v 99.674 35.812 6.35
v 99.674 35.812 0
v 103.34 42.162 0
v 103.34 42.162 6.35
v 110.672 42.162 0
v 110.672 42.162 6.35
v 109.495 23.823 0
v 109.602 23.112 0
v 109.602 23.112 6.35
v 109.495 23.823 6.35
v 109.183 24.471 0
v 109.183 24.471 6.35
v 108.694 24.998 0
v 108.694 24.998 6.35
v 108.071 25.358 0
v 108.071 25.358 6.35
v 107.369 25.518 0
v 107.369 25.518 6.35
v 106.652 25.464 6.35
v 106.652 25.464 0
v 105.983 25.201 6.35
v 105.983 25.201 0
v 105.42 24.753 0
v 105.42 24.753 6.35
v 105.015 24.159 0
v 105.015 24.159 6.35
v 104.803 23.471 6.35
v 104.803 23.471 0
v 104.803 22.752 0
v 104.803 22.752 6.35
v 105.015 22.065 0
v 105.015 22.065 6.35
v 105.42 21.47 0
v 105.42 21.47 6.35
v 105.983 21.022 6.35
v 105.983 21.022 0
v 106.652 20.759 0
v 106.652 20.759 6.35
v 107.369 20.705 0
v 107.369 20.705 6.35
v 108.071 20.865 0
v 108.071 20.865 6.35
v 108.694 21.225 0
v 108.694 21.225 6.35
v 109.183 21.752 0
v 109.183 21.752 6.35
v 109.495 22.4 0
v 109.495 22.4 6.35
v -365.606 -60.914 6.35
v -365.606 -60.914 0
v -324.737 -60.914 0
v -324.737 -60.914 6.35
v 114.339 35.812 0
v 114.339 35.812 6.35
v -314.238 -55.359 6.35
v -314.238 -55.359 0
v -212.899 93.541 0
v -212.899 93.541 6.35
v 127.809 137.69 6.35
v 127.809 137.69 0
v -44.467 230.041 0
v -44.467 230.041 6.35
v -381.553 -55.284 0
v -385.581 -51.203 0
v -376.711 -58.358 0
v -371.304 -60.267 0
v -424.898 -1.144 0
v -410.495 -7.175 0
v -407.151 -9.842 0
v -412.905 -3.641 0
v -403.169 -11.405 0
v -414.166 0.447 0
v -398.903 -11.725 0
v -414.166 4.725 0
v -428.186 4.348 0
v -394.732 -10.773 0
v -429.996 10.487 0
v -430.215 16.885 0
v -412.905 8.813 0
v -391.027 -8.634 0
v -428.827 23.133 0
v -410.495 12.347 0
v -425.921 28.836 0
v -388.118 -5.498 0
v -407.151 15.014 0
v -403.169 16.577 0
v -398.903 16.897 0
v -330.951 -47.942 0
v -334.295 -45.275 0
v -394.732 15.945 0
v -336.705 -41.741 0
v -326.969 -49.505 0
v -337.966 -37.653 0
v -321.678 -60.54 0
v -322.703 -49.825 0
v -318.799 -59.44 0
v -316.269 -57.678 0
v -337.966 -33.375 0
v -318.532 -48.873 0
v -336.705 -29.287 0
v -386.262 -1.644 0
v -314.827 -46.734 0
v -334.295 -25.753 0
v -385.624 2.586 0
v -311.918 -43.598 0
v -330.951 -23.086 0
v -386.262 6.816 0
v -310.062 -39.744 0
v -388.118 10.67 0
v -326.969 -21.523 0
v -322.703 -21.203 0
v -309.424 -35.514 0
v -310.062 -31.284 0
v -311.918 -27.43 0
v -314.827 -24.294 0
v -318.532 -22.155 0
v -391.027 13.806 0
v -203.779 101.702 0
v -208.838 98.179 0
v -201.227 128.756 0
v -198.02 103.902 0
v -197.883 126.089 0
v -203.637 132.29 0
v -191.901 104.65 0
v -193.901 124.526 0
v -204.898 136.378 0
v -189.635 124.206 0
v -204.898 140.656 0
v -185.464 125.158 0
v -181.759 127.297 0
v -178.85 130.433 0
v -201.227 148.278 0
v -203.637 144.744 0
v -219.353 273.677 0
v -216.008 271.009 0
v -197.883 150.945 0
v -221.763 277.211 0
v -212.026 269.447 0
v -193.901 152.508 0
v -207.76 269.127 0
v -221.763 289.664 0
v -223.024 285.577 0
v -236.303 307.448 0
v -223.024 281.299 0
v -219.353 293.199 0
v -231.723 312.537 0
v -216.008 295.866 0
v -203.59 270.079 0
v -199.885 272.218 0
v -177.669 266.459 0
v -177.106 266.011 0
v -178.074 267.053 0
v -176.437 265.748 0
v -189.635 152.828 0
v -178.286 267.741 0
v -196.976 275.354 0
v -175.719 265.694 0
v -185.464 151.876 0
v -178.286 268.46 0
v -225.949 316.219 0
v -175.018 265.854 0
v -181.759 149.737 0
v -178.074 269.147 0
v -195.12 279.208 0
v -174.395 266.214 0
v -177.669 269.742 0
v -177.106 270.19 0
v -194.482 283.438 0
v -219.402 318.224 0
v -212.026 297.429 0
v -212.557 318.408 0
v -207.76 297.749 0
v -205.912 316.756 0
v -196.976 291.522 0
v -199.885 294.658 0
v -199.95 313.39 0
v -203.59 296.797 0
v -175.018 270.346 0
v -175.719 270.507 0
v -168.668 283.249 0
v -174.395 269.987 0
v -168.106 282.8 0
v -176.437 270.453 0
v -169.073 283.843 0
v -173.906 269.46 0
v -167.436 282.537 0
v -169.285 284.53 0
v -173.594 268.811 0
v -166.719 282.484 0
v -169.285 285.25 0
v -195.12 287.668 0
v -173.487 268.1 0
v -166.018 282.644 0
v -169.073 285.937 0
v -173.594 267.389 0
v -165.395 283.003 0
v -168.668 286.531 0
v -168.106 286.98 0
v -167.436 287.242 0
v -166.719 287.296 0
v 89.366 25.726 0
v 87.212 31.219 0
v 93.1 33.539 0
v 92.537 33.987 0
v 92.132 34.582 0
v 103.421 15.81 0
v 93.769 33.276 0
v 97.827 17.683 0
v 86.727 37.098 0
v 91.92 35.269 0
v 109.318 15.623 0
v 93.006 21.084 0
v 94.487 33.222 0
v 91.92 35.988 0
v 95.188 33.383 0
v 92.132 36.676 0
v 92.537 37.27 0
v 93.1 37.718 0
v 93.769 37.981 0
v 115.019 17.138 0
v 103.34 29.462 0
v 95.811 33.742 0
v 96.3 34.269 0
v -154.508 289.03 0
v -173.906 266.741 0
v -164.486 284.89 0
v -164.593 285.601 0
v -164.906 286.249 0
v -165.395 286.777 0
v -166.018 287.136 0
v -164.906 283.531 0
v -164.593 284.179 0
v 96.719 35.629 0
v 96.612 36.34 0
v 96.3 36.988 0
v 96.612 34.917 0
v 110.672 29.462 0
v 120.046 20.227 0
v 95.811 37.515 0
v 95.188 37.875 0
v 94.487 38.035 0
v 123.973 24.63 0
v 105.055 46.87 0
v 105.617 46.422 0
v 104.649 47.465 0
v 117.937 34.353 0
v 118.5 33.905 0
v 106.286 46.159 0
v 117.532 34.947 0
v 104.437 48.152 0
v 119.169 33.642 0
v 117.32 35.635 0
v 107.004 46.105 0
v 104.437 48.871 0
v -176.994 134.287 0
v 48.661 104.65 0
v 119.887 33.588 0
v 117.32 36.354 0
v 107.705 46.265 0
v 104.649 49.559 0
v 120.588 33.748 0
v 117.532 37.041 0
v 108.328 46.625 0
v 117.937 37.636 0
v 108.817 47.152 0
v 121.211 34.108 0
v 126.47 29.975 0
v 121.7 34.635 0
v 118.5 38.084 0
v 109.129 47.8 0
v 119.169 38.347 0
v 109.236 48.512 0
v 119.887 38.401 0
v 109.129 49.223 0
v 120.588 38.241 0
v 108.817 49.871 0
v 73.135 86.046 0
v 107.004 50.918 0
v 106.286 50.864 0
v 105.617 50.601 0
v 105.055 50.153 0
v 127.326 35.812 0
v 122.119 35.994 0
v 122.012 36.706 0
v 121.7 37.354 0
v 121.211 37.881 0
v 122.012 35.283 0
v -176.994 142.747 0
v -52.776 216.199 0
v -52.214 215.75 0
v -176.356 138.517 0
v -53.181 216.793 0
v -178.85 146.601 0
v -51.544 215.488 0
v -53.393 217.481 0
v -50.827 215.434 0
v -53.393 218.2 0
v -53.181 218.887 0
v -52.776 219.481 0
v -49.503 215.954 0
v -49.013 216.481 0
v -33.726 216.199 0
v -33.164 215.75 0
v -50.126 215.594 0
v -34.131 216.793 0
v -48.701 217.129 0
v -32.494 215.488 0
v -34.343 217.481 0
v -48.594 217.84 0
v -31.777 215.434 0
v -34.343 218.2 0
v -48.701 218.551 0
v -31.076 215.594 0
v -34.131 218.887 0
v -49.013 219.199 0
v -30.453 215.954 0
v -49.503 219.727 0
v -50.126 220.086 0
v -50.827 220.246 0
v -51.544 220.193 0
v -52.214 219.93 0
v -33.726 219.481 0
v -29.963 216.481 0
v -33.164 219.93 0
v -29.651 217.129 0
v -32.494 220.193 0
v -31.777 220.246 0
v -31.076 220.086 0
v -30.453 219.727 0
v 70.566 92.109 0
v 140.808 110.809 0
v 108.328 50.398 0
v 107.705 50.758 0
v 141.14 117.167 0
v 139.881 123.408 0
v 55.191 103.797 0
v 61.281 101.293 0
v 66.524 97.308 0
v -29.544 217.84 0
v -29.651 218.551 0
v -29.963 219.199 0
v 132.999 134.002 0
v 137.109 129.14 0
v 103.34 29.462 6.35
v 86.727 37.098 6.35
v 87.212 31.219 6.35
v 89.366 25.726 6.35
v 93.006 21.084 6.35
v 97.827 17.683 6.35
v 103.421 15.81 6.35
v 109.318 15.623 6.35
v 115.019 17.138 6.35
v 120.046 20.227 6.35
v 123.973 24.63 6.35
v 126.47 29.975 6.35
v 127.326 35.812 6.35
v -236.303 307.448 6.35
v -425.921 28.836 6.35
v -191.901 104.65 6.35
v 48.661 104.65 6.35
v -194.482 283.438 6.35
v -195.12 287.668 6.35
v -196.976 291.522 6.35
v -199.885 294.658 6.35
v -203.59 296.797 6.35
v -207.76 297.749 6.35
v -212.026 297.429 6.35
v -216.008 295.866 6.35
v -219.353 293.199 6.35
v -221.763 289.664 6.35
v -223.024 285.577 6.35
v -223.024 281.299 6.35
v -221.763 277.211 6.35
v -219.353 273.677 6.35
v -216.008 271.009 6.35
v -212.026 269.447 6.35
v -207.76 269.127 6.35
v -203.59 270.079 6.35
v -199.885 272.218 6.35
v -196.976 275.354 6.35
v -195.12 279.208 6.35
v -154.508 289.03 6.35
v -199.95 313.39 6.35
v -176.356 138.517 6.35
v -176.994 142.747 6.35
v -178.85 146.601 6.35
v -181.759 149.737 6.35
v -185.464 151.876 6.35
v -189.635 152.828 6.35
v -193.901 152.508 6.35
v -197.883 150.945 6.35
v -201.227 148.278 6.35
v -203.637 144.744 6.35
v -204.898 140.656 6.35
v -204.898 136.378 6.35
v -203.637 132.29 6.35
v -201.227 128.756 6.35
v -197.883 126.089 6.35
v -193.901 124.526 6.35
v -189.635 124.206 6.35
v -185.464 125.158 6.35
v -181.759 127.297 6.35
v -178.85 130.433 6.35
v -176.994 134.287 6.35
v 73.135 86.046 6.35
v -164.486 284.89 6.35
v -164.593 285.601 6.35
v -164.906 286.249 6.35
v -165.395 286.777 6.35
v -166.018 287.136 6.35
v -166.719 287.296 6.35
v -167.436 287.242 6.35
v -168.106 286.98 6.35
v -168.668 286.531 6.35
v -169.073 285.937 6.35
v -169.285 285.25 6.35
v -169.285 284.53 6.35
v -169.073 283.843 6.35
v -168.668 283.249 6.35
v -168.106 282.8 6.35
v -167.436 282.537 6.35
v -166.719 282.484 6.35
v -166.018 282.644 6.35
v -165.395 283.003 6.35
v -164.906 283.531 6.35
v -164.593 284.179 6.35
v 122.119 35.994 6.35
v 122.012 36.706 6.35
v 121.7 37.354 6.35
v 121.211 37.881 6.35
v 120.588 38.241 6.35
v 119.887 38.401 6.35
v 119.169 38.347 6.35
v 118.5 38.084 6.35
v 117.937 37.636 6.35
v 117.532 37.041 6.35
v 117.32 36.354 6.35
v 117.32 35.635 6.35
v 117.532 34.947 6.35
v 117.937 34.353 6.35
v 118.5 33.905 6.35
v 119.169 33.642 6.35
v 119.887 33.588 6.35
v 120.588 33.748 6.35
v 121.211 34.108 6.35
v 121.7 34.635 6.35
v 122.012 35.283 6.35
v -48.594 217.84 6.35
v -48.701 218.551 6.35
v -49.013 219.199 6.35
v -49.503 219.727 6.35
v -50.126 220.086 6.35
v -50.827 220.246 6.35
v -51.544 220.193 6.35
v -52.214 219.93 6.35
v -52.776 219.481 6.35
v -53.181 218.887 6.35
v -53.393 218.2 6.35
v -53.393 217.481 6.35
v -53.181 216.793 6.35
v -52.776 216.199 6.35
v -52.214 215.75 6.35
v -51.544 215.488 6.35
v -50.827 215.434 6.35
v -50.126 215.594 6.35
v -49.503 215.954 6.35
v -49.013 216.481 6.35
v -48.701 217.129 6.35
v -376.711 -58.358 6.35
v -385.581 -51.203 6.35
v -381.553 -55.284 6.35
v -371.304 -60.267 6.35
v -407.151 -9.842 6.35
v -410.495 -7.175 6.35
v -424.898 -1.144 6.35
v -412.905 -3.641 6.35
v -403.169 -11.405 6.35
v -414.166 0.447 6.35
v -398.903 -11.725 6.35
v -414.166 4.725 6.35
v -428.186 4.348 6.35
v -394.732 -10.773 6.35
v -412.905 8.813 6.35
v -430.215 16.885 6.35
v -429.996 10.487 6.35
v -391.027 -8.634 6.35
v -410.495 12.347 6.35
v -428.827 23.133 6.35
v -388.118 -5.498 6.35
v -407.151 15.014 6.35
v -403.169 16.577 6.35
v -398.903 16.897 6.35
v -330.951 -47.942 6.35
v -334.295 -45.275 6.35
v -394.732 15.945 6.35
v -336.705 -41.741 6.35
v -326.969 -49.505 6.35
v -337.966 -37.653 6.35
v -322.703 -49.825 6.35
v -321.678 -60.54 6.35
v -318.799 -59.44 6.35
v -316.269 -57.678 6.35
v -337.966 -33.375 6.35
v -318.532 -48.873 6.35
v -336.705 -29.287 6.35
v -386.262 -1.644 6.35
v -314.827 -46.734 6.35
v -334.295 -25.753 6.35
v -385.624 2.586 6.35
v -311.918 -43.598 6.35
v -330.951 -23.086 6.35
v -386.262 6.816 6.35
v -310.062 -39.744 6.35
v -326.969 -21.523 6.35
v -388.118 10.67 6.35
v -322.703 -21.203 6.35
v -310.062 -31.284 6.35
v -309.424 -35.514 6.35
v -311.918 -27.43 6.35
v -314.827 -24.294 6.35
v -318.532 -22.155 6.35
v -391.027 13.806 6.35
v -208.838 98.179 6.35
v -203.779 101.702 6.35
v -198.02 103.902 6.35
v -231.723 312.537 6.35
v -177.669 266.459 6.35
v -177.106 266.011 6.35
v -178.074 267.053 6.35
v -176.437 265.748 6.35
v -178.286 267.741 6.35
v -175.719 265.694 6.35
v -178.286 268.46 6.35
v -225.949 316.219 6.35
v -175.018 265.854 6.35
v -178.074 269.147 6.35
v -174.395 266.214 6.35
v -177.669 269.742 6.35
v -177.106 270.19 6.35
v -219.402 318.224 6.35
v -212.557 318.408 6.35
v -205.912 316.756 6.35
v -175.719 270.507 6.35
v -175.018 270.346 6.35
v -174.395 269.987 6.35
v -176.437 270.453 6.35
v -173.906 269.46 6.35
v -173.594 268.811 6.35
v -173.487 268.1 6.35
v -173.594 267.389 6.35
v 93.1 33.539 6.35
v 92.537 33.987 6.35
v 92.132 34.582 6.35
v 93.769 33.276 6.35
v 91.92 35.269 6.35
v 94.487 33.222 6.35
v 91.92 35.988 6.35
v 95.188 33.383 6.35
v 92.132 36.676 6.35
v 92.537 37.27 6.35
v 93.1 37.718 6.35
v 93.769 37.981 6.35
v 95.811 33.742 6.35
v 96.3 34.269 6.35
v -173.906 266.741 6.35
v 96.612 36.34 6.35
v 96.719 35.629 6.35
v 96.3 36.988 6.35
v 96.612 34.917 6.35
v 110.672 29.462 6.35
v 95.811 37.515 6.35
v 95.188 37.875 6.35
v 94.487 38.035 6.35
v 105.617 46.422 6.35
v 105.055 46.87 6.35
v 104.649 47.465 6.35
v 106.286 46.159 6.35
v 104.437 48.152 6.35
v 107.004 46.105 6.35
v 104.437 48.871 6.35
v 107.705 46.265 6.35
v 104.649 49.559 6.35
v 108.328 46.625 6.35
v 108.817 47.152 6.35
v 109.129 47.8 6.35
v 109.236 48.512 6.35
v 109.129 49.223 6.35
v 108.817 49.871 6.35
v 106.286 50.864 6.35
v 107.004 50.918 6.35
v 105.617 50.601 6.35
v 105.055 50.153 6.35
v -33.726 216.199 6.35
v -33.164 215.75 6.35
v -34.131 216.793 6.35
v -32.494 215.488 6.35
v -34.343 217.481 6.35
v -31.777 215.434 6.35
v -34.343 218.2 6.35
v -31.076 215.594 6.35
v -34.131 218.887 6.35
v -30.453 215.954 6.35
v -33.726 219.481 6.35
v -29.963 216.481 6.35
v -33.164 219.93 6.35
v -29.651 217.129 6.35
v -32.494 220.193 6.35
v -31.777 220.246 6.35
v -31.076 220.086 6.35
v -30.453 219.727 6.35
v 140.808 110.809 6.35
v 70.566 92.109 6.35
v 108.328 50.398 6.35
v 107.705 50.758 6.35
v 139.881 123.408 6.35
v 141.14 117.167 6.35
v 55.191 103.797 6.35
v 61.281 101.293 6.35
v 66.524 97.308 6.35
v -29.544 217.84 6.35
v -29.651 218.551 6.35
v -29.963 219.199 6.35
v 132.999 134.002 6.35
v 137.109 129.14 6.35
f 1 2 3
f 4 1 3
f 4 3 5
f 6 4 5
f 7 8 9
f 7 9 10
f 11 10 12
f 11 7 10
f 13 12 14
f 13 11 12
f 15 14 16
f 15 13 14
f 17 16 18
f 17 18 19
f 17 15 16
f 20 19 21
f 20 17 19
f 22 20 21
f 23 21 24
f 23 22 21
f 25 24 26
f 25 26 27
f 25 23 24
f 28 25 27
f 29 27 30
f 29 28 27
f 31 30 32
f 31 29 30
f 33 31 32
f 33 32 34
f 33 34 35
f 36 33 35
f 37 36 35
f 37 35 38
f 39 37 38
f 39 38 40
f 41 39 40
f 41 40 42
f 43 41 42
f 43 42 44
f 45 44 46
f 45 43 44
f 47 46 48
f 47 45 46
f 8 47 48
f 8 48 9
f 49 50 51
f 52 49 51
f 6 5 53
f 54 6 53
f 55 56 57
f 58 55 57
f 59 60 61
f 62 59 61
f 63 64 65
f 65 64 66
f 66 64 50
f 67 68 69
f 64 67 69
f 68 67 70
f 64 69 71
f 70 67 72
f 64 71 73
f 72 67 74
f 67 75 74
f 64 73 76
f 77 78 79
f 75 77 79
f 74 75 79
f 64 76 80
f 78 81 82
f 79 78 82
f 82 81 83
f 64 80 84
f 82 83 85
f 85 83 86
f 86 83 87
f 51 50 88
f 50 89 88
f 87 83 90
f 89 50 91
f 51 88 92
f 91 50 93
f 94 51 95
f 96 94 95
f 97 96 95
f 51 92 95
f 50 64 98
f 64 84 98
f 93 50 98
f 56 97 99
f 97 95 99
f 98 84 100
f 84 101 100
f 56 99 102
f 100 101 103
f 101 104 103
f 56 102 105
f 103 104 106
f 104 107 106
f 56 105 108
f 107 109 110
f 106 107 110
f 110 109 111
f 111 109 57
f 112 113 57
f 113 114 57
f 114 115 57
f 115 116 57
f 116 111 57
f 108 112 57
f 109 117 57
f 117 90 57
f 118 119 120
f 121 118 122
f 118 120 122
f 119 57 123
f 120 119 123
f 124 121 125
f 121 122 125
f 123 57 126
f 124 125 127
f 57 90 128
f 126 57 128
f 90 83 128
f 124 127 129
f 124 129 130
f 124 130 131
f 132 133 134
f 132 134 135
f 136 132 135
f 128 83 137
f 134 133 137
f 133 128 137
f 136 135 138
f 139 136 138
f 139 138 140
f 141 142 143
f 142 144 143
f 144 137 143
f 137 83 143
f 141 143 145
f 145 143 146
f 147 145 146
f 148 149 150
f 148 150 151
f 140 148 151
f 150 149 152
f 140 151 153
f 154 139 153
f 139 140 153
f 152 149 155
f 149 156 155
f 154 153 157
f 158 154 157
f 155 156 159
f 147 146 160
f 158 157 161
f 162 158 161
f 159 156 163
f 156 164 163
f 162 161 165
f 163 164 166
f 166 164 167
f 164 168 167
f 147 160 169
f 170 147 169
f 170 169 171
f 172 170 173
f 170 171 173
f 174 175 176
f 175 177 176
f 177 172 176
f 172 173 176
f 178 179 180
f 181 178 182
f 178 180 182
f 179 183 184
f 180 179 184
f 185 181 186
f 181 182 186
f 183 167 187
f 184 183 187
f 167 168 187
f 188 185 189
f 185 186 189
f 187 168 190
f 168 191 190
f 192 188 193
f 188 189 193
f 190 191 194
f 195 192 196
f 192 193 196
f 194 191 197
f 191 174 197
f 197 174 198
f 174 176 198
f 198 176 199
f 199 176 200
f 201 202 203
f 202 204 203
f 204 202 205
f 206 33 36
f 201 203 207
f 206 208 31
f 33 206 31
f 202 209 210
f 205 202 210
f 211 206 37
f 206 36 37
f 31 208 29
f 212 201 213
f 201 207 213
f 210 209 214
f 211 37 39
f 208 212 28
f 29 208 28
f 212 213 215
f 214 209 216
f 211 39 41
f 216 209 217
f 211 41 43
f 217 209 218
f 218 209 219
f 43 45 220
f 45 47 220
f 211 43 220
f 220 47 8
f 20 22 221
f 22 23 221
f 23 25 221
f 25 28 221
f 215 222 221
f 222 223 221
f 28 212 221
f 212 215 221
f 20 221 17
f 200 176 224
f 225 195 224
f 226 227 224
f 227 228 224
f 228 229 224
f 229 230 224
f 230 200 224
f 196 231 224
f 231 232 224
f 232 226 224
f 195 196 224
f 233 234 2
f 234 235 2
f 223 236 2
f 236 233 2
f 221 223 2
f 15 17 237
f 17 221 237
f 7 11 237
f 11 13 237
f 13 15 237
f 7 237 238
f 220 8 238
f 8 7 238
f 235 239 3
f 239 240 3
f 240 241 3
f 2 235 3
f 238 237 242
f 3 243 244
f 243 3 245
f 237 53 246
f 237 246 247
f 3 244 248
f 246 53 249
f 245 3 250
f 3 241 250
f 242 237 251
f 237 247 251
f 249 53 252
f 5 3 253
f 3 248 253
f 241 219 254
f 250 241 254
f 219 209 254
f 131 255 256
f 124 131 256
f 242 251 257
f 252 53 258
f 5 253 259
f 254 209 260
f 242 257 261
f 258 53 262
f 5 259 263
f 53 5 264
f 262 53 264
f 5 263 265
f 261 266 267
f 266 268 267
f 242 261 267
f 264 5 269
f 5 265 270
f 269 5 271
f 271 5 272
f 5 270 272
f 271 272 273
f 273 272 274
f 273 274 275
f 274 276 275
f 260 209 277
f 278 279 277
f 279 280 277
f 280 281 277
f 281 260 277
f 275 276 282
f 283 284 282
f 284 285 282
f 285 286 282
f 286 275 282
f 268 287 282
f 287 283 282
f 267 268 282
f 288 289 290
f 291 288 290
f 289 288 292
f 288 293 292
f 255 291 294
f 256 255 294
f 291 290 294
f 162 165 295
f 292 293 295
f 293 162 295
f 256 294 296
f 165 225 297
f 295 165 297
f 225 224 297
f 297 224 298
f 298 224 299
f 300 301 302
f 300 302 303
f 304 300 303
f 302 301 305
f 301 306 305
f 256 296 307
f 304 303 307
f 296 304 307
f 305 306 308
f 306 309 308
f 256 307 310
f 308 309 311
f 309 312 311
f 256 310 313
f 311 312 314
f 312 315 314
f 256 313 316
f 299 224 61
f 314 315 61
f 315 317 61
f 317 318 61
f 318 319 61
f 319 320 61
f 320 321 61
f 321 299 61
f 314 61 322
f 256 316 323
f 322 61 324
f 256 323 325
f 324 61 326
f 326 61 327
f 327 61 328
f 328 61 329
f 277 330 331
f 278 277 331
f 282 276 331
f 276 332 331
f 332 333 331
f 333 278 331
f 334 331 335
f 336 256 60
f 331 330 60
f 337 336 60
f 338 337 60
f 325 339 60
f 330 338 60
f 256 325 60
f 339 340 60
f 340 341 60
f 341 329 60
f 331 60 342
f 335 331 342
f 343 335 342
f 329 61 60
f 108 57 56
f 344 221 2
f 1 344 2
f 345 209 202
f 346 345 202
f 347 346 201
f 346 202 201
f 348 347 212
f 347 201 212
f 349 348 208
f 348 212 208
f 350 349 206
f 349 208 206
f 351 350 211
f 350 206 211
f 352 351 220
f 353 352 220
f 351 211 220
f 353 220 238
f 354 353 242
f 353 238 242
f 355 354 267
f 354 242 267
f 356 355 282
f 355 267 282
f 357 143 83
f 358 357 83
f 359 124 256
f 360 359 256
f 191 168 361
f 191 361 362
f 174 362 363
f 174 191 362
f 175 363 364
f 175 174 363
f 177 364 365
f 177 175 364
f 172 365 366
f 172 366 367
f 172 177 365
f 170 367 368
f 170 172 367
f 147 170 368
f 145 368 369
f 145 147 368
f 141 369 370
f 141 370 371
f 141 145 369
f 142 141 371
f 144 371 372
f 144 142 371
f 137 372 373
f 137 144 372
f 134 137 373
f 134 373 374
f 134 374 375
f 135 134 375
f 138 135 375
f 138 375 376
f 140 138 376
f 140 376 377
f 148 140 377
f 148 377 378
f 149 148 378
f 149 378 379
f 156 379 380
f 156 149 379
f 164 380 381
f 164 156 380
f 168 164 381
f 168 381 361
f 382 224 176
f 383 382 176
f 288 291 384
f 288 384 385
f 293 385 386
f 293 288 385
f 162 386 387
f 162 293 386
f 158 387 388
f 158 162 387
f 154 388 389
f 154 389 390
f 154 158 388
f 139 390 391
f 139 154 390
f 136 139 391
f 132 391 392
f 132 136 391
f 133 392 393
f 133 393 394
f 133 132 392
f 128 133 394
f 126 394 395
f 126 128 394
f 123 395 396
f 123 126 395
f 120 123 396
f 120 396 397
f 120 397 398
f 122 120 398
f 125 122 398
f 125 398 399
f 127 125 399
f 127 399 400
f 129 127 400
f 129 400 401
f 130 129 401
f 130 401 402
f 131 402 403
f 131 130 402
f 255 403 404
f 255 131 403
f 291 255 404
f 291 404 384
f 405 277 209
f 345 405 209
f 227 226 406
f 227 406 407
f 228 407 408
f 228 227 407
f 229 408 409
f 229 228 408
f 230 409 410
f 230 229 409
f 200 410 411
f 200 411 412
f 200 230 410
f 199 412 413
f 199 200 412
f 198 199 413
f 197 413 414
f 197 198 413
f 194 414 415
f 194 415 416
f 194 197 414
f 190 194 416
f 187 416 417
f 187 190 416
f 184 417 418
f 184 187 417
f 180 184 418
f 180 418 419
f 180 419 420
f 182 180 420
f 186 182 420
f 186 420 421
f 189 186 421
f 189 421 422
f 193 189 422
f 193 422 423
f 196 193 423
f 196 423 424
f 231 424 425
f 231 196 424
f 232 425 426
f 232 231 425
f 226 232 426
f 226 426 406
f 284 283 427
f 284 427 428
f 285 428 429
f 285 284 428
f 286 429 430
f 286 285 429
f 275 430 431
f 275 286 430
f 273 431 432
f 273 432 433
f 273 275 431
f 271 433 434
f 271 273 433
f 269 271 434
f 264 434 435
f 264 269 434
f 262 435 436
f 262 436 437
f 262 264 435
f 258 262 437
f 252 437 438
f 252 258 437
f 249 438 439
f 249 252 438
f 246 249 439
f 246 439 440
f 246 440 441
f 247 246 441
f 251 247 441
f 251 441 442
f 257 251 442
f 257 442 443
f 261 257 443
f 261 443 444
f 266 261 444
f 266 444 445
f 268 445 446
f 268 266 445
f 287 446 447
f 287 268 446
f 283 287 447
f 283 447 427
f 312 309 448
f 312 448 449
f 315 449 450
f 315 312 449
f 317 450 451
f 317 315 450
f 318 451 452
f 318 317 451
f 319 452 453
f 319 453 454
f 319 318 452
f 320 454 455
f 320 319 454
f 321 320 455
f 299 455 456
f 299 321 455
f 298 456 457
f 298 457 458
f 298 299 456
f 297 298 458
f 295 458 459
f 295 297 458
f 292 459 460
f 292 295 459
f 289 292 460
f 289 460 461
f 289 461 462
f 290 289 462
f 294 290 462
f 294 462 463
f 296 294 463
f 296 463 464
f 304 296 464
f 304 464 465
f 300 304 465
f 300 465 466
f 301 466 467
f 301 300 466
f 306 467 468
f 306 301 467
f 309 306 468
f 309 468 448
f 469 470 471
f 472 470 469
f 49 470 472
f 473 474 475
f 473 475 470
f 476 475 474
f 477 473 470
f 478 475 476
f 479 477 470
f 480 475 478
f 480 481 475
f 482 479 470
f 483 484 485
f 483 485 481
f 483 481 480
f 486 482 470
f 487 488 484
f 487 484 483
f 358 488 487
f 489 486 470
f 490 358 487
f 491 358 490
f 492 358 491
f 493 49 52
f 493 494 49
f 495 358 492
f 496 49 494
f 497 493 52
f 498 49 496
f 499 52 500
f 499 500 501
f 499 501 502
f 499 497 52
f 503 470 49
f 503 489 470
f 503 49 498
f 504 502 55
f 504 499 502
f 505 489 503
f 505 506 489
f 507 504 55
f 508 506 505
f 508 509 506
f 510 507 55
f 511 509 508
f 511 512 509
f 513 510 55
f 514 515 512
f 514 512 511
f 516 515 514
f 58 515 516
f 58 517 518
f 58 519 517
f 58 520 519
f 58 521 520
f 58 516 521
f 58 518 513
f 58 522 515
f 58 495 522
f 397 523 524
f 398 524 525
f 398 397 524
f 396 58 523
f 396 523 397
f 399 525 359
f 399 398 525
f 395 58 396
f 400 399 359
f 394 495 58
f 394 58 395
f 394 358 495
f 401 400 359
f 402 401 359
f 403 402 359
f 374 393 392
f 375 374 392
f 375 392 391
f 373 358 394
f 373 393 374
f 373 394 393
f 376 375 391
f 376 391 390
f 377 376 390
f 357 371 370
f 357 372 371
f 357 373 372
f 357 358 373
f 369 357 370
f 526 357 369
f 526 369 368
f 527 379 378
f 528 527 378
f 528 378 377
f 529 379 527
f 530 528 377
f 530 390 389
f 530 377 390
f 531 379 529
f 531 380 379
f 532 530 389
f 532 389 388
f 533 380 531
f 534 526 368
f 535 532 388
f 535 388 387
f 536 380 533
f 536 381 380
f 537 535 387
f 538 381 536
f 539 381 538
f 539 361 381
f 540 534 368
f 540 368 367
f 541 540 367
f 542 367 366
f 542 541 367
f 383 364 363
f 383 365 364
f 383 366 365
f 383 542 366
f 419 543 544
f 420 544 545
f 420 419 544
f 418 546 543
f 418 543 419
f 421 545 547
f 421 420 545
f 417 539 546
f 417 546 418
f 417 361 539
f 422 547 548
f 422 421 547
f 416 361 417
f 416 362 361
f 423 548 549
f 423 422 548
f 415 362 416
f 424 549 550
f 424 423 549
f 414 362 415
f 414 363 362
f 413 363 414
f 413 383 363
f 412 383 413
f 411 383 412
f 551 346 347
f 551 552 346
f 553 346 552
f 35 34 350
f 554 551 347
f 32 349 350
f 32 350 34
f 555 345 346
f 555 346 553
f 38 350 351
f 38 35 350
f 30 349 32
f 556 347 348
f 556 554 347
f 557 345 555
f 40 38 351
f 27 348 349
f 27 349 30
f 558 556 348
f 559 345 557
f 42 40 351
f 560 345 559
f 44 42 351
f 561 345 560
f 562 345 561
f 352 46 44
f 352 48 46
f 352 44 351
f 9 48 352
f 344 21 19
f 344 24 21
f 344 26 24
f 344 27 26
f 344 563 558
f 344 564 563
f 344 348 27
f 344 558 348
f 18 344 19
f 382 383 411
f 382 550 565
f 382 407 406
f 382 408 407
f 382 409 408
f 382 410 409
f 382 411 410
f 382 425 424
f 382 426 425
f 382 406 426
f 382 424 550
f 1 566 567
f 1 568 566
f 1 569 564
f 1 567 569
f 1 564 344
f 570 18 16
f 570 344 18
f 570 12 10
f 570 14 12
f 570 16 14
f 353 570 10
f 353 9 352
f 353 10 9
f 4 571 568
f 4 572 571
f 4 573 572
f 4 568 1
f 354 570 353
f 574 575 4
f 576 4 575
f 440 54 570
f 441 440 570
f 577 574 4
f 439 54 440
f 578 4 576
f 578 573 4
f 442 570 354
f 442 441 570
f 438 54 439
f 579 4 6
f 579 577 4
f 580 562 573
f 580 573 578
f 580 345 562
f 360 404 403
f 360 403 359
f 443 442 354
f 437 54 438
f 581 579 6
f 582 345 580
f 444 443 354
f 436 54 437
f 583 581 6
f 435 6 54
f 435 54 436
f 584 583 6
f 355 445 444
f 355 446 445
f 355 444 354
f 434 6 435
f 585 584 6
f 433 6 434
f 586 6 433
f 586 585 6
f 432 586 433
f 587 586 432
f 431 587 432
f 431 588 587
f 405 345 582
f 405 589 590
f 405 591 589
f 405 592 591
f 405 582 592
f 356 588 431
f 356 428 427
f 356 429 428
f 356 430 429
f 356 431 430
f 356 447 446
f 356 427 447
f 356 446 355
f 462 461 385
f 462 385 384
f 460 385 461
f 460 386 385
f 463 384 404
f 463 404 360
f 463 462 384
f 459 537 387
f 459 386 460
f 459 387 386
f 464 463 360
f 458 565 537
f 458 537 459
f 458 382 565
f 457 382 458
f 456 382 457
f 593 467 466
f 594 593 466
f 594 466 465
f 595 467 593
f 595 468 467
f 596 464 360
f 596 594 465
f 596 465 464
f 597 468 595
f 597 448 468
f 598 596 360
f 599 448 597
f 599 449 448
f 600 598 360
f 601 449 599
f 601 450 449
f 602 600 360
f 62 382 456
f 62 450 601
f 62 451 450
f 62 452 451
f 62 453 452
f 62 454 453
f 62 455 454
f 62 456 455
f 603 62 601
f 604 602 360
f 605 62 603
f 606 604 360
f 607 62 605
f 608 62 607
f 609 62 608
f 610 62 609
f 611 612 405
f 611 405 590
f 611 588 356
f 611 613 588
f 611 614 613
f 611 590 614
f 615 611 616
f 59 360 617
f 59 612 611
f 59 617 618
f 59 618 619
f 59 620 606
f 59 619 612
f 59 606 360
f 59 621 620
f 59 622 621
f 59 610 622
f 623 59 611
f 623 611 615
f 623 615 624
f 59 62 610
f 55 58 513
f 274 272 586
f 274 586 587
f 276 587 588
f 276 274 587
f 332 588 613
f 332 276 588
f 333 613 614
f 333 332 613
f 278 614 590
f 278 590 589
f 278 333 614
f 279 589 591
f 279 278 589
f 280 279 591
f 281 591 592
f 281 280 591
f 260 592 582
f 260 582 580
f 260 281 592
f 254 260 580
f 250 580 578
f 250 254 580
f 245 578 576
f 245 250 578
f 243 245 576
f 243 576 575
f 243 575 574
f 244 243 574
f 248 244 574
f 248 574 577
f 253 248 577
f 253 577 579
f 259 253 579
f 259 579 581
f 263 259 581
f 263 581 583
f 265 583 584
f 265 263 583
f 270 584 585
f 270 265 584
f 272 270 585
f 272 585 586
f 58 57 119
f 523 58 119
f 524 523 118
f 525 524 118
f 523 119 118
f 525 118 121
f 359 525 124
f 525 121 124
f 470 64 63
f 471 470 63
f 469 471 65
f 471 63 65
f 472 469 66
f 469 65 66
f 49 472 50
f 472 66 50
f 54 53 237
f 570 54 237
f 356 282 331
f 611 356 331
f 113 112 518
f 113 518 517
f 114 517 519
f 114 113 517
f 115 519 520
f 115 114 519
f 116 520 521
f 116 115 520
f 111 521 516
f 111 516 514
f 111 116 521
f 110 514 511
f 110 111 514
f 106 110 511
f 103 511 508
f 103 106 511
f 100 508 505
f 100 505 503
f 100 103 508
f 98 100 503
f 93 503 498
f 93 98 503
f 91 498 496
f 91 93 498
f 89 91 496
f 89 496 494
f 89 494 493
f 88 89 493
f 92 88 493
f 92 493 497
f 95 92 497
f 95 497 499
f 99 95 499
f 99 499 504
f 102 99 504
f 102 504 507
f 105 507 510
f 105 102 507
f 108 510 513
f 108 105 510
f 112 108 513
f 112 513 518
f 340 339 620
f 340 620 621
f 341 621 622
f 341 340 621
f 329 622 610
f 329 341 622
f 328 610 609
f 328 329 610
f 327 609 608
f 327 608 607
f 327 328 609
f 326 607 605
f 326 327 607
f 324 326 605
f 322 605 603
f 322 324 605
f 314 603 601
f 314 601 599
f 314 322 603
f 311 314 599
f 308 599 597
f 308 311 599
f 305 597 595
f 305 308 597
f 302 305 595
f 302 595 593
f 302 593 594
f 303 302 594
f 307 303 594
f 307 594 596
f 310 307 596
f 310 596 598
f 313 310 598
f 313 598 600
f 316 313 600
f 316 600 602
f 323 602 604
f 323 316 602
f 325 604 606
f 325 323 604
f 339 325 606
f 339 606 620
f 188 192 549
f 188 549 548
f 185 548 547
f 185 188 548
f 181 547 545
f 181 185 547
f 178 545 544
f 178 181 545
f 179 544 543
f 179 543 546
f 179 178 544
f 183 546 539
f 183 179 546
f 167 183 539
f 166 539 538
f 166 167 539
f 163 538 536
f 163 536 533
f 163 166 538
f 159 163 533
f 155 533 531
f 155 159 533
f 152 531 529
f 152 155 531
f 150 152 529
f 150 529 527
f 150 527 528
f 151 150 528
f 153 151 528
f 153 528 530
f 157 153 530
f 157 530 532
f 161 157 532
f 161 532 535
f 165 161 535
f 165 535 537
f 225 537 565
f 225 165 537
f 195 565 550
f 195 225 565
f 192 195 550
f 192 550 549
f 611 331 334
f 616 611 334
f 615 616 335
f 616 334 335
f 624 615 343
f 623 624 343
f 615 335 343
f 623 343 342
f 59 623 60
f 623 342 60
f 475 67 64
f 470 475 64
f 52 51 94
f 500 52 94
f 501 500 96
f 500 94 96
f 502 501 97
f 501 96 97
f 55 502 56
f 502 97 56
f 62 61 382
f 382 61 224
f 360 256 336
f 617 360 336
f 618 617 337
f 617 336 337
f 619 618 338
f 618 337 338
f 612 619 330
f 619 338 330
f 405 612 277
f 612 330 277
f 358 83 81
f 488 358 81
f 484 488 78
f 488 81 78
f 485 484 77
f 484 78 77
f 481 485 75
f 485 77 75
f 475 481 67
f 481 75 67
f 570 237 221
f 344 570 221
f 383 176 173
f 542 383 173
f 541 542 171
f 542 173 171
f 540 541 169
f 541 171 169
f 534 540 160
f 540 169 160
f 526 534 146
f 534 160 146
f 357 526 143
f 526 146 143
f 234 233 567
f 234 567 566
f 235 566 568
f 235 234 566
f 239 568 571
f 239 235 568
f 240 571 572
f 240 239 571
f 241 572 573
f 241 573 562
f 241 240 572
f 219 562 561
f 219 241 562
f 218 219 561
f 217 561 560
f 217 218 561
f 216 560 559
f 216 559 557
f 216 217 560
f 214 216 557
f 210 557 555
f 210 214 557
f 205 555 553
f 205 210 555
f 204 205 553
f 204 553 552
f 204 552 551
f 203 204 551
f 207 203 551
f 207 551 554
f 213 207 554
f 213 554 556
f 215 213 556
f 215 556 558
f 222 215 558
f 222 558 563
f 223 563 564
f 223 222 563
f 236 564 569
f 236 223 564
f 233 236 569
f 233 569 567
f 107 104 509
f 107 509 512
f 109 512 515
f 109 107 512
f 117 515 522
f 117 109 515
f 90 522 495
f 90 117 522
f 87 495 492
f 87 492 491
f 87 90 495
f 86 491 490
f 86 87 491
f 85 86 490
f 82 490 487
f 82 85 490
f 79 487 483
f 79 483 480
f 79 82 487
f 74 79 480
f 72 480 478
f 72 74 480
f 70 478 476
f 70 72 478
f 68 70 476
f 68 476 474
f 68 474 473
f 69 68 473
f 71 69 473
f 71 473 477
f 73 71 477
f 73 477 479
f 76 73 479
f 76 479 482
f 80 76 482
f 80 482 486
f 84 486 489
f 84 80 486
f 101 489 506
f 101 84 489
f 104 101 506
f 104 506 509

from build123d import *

# Parameters (mm, degrees)
MODEL_R             = 14.351
MODEL_R_2           = 2.413
BOSS_EXTRUDE1_DEPTH = 6.35


with BuildPart() as part:
    # Model → Boss-Extrude1 (new body)
    with BuildSketch(Plane.XY):
        with BuildLine():
            ThreePointArc((-212.899365952, 93.541257838), (-203.778989185, 101.701881024), (-191.901103209, 104.650248016))
            Line((-191.901103209, 104.650248016), (48.661197018, 104.650248016))
            ThreePointArc((48.661197018, 104.650248016), (64.032332507, 99.471232012), (73.135172194, 86.046168785))
            Line((73.135172194, 86.046168785), (86.727013732, 37.098218434))
            ThreePointArc((86.727013732, 37.098218434), (106.36258142, 15.501750179), (127.326236921, 35.811553418))
            Line((127.326236921, 35.811553418), (140.807890588, 110.809453484))
            ThreePointArc((140.807890588, 110.809453484), (138.675228362, 126.361225539), (127.809114585, 137.689660276))
            Line((127.809114585, 137.689660276), (-44.466784077, 230.040741354))
            Line((-44.466784077, 230.040741354), (-154.507929168, 289.02994873))
            Line((-154.507929168, 289.02994873), (-199.949582693, 313.389629113))
            ThreePointArc((-199.949582693, 313.389629113), (-219.402189514, 318.224062751), (-236.303247901, 307.447705012))
            Line((-236.303247901, 307.447705012), (-425.920878295, 28.83612519))
            ThreePointArc((-425.920878295, 28.83612519), (-430.307847502, 13.679090678), (-424.898106806, -1.143726181))
            Line((-424.898106806, -1.143726181), (-385.58146606, -51.20282143))
            ThreePointArc((-385.58146606, -51.20282143), (-376.71145599, -58.357541068), (-365.605974805, -60.913979882))
            Line((-365.605974805, -60.913979882), (-324.737451002, -60.913979882))
            ThreePointArc((-324.737451002, -60.913979882), (-318.798508014, -59.439796386), (-314.23831963, -55.359484793))
            Line((-314.23831963, -55.359484793), (-212.899365952, 93.541257838))
        make_face()
        with Locations((-323.775189267, -35.513979882)):
            Circle(MODEL_R, mode=Mode.SUBTRACT)
        with Locations((-399.975189267, 2.586020118)):
            Circle(MODEL_R, mode=Mode.SUBTRACT)
        with Locations((107.189078625, 23.111553418)):
            Circle(MODEL_R_2, mode=Mode.SUBTRACT)
        with Locations((94.306236921, 35.628711714)):
            Circle(MODEL_R_2, mode=Mode.SUBTRACT)
        Polygon((110.67241113, 42.161553418), (114.338585339, 35.811553418), (110.67241113, 29.461553418), (103.340062711, 29.461553418), (99.673888502, 35.811553418), (103.340062711, 42.161553418), (106.823395217, 42.161553418), align=None, mode=Mode.SUBTRACT)
        with Locations((119.706236921, 35.994395122)):
            Circle(MODEL_R_2, mode=Mode.SUBTRACT)
        with Locations((106.823395217, 48.511553418)):
            Circle(MODEL_R_2, mode=Mode.SUBTRACT)
        with Locations((-190.707148919, 138.516914683)):
            Circle(MODEL_R, mode=Mode.SUBTRACT)
        with Locations((-175.899669139, 268.100247422)):
            Circle(MODEL_R_2, mode=Mode.SUBTRACT)
        with Locations((-208.832932893, 283.437784316)):
            Circle(MODEL_R, mode=Mode.SUBTRACT)
        with Locations((-166.899276125, 284.889989099)):
            Circle(MODEL_R_2, mode=Mode.SUBTRACT)
        with Locations((-51.007069668, 217.840195735)):
            Circle(MODEL_R_2, mode=Mode.SUBTRACT)
        with Locations((-31.957069668, 217.840195735)):
            Circle(MODEL_R_2, mode=Mode.SUBTRACT)
    extrude(amount=BOSS_EXTRUDE1_DEPTH)


solid = part.part
